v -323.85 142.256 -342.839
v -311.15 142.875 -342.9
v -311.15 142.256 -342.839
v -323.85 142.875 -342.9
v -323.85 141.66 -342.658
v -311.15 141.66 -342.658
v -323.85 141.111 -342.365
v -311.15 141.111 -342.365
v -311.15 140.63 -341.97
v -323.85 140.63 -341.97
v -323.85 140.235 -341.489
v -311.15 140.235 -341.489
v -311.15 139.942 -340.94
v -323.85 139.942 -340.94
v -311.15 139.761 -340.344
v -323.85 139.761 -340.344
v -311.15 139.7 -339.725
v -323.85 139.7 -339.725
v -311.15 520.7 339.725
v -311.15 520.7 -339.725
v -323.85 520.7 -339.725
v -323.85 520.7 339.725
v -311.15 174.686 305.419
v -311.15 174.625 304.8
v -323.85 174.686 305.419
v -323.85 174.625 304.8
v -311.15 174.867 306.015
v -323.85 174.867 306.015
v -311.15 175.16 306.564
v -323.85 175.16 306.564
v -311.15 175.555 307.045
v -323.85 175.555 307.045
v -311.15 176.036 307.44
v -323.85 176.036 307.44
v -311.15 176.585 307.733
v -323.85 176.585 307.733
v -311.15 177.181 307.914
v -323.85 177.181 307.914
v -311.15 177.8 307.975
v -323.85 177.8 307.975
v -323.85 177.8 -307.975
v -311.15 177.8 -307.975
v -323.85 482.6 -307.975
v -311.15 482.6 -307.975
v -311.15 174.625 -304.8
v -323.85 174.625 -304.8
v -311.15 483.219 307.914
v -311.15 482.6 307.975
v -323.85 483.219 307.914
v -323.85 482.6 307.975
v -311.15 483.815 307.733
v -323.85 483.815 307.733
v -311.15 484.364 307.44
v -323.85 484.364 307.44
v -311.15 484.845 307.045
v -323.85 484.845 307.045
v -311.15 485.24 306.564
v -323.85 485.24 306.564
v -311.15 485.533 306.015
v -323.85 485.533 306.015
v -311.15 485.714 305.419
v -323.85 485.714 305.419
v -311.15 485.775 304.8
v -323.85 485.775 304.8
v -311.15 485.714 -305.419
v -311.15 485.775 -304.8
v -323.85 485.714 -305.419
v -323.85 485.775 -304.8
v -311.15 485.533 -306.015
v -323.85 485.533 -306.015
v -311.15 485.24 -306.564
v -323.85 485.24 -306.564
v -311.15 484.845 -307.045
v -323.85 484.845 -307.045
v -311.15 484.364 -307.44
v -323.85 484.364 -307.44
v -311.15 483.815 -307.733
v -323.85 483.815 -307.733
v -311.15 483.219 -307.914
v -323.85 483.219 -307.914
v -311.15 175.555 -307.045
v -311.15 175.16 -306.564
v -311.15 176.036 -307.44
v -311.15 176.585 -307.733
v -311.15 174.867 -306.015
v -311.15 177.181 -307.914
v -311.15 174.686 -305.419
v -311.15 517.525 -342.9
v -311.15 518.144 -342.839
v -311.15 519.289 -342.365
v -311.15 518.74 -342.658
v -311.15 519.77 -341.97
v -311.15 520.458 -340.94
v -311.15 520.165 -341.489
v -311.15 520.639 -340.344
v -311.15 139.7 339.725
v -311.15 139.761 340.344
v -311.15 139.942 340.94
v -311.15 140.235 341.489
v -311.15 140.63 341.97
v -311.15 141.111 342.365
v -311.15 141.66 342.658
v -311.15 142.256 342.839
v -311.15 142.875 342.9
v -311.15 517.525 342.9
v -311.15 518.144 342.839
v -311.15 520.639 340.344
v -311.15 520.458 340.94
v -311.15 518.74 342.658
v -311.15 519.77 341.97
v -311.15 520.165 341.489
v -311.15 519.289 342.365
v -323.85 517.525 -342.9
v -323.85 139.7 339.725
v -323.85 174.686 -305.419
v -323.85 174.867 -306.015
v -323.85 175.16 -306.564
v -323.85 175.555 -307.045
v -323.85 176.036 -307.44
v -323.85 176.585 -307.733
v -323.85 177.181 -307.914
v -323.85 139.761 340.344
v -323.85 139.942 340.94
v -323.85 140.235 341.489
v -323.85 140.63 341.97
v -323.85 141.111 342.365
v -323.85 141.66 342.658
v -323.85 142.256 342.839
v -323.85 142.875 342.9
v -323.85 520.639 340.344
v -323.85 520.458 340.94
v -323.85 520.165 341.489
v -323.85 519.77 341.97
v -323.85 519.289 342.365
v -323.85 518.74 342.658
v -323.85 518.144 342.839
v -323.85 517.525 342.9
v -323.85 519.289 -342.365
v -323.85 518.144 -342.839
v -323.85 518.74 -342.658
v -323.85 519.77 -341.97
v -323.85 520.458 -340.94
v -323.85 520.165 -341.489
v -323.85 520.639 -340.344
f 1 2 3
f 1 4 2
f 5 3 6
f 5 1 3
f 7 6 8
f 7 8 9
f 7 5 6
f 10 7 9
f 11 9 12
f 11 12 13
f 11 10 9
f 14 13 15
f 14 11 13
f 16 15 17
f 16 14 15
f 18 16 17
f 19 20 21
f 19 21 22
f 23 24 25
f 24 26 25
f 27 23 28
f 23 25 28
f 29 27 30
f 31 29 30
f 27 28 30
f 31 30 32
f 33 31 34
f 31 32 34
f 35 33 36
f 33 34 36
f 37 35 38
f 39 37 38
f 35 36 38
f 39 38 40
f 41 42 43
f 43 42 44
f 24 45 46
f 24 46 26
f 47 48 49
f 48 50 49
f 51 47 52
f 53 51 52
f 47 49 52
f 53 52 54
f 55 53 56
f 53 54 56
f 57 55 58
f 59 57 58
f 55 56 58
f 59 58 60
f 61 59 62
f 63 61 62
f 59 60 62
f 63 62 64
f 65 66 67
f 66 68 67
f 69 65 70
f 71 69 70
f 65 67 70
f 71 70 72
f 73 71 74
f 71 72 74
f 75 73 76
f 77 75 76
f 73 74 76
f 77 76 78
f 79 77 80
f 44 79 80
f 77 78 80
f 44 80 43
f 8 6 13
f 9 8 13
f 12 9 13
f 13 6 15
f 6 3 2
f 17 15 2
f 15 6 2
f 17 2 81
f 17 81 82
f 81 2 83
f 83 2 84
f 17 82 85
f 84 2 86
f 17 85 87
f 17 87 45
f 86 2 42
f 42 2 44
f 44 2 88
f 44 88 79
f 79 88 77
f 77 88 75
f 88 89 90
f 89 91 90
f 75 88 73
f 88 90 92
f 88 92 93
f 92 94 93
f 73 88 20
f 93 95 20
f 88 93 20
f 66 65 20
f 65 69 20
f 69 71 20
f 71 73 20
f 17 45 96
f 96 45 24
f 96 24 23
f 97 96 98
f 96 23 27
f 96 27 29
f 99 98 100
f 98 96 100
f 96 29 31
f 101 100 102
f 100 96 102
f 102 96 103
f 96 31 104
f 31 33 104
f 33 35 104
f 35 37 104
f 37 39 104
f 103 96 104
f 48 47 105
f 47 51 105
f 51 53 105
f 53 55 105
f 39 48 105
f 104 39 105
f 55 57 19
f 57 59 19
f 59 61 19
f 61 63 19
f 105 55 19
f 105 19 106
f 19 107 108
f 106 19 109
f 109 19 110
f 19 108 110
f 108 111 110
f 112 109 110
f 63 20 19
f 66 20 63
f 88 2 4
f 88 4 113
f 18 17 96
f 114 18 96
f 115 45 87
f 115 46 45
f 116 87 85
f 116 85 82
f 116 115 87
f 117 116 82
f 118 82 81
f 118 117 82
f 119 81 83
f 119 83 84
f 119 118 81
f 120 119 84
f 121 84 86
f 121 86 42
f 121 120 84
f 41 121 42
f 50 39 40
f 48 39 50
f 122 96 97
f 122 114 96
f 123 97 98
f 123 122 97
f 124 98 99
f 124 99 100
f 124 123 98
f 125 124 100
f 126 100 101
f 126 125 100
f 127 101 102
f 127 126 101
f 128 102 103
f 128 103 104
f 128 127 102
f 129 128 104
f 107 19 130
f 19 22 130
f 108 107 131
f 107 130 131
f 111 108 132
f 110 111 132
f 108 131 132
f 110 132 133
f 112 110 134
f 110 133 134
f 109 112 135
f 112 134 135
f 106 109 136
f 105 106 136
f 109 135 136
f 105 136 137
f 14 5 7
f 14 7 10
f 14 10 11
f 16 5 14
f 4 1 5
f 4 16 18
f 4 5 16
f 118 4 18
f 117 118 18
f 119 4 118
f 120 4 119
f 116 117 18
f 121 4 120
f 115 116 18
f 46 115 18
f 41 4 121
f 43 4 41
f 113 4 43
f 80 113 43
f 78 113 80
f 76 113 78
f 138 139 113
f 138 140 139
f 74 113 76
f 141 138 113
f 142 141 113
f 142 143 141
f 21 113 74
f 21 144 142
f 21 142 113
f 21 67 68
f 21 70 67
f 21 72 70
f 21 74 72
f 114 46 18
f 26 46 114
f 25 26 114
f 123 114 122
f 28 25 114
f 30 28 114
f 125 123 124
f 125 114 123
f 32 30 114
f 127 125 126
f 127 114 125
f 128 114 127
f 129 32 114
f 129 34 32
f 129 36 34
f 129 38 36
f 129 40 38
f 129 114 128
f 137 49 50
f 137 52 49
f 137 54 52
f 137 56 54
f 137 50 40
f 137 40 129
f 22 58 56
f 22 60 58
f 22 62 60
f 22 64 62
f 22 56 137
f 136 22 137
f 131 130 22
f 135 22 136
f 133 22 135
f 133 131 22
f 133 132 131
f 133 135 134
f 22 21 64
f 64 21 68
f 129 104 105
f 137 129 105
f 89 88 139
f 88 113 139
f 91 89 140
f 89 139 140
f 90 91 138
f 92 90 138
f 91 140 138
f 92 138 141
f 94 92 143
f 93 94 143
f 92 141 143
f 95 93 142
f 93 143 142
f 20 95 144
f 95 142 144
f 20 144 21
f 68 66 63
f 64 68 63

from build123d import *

# Parameters (mm, degrees)
SKETCH1_W           = 685.8
SKETCH1_H           = 381
SKETCH1_W_2         = 615.95
SKETCH1_H_2         = 311.15
BOSS_EXTRUDE1_DEPTH = 12.7
FILLET1_R           = 3.175


with BuildPart() as part:
    # Sketch1 → Boss-Extrude1 (new body)
    with BuildSketch(Plane.ZY.offset(311.15)):
        with Locations((0, 330.2)):
            Rectangle(SKETCH1_W, SKETCH1_H)
        with Locations((0, 330.2)):
            Rectangle(SKETCH1_W_2, SKETCH1_H_2, mode=Mode.SUBTRACT)
    extrude(amount=BOSS_EXTRUDE1_DEPTH)

    # Fillet1
    fillet1_edges = [part.edges().sort_by_distance(p)[0] for p in [
        (-317.5, 485.775, -307.975),
        (-317.5, 174.625, -307.975),
        (-317.5, 174.625, 307.975),
        (-317.5, 485.775, 307.975),
        (-317.5, 520.7, -342.9),
        (-317.5, 520.7, 342.9),
        (-317.5, 139.7, 342.9),
        (-317.5, 139.7, -342.9),
    ]]
    fillet(fillet1_edges, radius=FILLET1_R)


solid = part.part
